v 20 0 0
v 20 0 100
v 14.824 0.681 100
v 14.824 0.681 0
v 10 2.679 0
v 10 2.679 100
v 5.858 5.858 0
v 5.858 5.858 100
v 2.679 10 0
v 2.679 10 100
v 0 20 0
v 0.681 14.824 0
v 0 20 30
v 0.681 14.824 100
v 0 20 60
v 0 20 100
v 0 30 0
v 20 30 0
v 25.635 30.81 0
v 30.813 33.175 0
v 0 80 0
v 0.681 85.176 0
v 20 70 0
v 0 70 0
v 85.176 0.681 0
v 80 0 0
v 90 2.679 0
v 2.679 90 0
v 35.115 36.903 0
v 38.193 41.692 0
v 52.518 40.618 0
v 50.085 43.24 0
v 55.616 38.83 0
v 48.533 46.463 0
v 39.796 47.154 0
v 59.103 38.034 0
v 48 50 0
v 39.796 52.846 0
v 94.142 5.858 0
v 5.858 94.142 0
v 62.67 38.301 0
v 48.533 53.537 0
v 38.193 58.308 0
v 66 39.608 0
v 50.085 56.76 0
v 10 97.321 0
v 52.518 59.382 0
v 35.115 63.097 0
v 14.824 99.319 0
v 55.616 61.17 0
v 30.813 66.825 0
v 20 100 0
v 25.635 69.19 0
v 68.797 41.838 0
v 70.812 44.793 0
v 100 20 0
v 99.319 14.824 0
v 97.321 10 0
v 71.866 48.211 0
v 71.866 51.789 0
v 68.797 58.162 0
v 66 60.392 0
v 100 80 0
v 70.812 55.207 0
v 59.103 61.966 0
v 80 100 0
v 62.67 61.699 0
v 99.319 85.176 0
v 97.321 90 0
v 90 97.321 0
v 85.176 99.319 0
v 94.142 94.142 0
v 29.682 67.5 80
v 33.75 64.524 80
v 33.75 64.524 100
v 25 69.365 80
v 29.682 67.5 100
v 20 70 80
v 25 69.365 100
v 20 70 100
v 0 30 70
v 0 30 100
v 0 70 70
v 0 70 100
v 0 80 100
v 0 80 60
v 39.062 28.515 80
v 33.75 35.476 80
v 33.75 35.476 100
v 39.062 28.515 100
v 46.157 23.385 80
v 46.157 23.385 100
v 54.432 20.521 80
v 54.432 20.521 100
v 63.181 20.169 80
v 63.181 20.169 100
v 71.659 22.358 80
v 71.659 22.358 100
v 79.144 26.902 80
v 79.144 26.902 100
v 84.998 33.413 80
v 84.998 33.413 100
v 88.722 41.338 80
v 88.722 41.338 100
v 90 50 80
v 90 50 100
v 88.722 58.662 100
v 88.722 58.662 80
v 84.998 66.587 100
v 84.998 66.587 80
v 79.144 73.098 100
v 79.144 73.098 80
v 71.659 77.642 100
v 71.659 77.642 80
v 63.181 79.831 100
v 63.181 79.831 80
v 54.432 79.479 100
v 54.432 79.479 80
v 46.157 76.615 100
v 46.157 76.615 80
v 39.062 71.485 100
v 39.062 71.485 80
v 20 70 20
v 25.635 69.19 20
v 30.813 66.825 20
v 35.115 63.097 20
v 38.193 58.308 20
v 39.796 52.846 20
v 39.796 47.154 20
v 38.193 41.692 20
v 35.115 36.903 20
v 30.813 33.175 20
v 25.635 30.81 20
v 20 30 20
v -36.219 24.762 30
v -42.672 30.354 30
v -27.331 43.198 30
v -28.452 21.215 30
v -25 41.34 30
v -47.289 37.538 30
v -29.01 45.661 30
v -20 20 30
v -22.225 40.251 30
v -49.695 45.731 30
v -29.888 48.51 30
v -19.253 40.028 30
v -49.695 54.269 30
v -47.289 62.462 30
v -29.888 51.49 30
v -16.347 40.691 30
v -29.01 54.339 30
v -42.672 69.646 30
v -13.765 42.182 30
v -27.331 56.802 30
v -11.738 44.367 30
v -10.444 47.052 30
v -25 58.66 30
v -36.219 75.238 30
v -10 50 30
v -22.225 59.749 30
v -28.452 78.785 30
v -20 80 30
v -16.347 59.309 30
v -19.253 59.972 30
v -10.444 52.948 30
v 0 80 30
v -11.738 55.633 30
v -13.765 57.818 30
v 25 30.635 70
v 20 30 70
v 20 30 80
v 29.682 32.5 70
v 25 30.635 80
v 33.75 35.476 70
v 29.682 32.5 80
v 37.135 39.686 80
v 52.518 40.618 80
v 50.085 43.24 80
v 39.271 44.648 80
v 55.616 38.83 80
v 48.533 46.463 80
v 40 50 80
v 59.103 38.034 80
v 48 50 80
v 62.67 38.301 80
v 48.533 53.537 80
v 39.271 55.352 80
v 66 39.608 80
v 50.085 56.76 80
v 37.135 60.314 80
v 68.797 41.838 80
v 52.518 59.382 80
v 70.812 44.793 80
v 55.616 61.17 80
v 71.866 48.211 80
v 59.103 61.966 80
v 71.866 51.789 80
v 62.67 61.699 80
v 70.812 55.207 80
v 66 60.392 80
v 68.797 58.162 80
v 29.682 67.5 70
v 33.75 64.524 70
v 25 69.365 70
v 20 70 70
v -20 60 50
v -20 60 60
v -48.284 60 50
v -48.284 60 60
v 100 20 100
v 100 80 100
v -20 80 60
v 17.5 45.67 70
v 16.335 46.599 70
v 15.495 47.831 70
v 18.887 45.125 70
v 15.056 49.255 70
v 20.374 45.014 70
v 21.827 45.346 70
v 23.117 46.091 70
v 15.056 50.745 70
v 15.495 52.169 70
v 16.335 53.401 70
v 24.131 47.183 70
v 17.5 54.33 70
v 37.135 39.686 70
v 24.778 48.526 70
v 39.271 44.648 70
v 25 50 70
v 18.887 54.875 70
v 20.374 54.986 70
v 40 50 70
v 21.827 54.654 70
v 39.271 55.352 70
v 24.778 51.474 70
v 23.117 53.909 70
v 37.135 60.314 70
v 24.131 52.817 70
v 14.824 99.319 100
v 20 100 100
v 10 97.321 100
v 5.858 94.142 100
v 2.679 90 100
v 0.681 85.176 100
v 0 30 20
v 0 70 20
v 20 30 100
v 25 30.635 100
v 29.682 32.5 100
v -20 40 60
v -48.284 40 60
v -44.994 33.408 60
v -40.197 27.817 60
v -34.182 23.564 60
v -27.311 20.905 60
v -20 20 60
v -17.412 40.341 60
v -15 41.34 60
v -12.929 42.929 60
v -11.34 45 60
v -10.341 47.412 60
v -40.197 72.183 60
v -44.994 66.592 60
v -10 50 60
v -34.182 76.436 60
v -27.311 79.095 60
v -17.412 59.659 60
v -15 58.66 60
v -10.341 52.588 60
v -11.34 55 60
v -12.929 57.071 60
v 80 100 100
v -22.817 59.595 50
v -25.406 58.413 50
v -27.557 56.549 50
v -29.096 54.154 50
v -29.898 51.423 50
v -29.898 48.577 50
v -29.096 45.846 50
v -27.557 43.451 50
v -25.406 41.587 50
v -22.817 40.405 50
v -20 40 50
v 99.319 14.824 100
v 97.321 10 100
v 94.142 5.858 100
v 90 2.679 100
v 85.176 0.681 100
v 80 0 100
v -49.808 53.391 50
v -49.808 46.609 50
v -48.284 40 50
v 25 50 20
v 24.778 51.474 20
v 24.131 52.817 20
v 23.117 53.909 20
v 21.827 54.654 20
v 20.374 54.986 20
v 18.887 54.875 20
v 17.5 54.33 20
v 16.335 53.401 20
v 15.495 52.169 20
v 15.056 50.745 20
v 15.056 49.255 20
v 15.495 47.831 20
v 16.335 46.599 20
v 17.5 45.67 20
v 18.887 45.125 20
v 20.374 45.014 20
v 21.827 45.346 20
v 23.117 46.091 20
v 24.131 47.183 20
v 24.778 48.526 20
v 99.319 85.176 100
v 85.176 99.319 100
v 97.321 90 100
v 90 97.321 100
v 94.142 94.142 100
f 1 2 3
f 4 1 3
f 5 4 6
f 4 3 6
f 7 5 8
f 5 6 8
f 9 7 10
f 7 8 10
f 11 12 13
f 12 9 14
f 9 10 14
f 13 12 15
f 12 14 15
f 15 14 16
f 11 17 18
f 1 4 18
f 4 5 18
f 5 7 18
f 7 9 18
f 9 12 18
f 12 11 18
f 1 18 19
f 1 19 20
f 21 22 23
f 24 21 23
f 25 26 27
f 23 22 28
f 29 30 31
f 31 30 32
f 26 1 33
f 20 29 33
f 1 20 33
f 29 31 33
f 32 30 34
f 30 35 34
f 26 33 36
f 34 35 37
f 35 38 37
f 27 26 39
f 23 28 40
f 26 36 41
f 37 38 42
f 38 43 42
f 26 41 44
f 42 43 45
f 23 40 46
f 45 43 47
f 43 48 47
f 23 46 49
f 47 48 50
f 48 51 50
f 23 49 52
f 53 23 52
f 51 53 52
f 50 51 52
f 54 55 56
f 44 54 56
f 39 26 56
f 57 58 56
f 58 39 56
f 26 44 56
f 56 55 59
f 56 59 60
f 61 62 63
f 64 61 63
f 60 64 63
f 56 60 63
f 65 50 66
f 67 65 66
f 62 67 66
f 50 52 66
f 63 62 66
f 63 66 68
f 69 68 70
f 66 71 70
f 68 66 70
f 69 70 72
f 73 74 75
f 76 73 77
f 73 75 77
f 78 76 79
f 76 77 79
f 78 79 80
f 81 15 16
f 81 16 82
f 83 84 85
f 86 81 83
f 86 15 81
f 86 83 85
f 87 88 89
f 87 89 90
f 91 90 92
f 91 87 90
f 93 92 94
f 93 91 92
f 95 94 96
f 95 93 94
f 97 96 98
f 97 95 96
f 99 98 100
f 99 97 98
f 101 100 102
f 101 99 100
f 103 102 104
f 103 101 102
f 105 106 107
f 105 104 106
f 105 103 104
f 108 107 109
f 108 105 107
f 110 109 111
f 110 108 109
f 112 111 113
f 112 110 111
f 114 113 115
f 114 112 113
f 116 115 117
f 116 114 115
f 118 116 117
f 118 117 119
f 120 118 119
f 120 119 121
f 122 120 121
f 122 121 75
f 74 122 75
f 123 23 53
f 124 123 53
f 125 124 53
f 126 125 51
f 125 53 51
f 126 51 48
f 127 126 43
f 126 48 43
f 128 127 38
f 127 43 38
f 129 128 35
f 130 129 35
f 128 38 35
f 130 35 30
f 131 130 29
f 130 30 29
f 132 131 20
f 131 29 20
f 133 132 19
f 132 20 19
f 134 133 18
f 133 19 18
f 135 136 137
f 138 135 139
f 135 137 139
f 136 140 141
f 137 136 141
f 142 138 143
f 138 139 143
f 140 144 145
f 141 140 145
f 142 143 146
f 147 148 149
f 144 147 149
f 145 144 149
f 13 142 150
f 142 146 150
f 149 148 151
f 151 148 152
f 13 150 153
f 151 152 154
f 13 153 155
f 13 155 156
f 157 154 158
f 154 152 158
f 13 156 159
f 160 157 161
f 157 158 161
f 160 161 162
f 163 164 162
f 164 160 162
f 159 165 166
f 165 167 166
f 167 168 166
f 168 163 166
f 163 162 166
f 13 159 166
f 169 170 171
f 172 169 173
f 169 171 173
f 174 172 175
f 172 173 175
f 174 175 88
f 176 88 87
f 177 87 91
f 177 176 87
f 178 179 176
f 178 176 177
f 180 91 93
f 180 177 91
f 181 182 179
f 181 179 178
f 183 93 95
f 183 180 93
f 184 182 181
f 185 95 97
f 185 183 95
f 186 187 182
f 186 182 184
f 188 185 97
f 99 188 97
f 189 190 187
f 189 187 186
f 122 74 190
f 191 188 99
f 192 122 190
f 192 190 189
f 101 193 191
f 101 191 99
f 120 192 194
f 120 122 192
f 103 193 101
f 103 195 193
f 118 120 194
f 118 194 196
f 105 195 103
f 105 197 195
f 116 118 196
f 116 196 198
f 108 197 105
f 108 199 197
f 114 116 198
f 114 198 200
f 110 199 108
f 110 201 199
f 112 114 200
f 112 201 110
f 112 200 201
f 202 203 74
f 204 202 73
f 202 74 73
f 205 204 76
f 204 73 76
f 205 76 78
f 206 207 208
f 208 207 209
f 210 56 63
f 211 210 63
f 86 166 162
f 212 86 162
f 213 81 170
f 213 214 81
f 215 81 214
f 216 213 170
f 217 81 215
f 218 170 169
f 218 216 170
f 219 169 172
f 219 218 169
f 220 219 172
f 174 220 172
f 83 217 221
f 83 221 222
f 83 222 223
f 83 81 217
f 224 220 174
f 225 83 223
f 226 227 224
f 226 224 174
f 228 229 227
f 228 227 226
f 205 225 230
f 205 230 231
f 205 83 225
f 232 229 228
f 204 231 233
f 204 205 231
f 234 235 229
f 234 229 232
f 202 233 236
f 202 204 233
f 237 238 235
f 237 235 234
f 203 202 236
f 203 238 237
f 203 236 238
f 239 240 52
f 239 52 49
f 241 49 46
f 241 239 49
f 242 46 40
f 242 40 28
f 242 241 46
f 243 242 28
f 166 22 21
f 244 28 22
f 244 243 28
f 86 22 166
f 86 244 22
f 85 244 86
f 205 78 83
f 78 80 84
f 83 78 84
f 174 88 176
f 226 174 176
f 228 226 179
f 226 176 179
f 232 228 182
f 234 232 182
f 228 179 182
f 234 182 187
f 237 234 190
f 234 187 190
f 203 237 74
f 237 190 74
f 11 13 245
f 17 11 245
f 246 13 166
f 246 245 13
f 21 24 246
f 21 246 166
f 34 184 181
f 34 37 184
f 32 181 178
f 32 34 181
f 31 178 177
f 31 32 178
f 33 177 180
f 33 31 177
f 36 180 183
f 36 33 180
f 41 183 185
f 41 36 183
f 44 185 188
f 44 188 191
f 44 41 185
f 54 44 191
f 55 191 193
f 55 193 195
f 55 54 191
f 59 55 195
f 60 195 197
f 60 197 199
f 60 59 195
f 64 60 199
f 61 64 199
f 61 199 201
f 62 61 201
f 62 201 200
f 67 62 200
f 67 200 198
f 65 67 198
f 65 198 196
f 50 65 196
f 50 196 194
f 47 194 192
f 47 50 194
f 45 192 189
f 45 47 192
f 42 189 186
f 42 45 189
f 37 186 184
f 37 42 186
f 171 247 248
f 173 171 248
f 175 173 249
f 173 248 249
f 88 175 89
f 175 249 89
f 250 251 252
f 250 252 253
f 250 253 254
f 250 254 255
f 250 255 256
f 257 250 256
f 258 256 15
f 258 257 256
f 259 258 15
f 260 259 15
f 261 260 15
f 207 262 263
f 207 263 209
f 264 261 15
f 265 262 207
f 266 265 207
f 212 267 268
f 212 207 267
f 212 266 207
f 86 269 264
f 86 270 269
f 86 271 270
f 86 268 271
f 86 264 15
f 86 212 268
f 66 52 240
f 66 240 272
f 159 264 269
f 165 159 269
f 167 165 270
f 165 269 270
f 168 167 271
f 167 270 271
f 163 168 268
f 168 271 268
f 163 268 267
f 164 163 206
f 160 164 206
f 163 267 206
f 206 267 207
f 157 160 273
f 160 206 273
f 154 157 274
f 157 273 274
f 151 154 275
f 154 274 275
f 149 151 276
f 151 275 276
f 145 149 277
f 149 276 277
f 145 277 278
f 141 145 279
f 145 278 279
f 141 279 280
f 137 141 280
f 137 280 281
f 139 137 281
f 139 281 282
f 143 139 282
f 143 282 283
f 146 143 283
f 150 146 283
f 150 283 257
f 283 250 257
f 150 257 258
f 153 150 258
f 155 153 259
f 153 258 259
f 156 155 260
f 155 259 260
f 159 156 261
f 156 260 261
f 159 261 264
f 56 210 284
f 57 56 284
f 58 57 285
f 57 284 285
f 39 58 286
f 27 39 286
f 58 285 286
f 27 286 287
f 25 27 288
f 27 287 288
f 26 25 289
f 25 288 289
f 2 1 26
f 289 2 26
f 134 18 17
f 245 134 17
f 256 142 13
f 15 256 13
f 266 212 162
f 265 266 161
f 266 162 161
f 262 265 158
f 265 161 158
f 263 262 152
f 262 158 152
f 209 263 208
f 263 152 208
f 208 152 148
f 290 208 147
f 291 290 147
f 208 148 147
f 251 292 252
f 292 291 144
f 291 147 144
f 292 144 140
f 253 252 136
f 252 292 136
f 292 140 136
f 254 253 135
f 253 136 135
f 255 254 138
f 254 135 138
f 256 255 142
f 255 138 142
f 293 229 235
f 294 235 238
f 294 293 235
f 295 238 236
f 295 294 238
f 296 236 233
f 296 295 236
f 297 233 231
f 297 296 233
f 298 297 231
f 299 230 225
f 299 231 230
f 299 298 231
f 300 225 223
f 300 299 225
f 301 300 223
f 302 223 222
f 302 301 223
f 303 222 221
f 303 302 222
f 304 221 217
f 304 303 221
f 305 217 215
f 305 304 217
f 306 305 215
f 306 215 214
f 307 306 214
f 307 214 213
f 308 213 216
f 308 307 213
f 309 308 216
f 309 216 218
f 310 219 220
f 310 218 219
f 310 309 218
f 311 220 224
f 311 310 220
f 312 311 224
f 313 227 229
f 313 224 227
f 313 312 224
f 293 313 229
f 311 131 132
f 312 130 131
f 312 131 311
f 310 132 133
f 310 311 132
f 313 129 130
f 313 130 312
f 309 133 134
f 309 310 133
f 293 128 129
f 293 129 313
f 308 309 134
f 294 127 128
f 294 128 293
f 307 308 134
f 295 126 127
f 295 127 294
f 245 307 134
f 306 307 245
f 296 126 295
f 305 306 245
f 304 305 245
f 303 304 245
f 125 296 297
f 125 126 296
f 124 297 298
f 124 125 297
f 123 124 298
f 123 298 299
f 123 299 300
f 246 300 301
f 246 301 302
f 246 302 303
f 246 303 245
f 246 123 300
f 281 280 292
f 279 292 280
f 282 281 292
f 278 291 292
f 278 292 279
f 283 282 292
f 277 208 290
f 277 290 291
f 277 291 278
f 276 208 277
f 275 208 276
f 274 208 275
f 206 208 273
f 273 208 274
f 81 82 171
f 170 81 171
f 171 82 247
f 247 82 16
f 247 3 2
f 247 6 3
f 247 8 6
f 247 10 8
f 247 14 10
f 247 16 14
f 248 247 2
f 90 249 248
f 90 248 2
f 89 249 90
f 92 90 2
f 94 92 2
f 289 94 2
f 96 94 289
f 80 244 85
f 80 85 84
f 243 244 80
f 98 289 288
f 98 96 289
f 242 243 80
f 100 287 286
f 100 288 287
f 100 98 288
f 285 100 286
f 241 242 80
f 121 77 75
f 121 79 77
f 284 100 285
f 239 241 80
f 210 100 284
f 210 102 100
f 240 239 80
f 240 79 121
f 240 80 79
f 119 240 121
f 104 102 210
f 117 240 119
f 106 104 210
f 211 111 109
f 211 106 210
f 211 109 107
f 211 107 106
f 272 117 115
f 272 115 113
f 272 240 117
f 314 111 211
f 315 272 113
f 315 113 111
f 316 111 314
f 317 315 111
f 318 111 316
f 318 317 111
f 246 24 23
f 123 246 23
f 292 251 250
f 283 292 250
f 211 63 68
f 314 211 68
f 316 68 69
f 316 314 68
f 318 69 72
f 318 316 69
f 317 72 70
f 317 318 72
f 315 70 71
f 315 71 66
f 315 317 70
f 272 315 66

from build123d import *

# Parameters (mm, degrees)
SKETCH1_W           = 100
SKETCH1_H           = 100
BOSS_EXTRUDE1_DEPTH = 100
CUT_EXTRUDE1_DEPTH  = 100
SKETCH3_R           = 12
CUT_EXTRUDE2_DEPTH  = 80
SKETCH5_R           = 5
CUT_EXTRUDE3_DEPTH  = 50
BOSS_EXTRUDE2_DEPTH = 30
SKETCH8_R           = 10
CUT_EXTRUDE4_DEPTH  = 30
CUT_EXTRUDE5_DEPTH  = 10
SKETCH10_R          = 30
CUT_EXTRUDE6_DEPTH  = 96
CUT_EXTRUDE7_DEPTH  = 30
BOSS_EXTRUDE5_DEPTH = 10
SKETCH15_R          = 30
SKETCH15_R_2        = 12
BOSS_EXTRUDE6_DEPTH = 40
SKETCH16_R          = 12
BOSS_EXTRUDE7_DEPTH = 10
CUT_EXTRUDE8_DEPTH  = 10
CUT_EXTRUDE9_DEPTH  = 20


with BuildPart() as part:
    # Sketch1 → Boss-Extrude1 (new body)
    with BuildSketch(Plane.XY):
        with Locations((50, 50)):
            Rectangle(SKETCH1_W, SKETCH1_H)
    extrude(amount=BOSS_EXTRUDE1_DEPTH)

    # Sketch2 → Cut-Extrude1 (cut)
    with BuildSketch(Plane.XY.offset(100)):
        with BuildLine():
            Line((0, 80), (0, 100))
            Line((0, 100), (20, 100))
            ThreePointArc((20, 100), (5.857864376, 94.142135624), (0, 80))
        make_face()
        with BuildLine():
            Line((80, 100), (100, 100))
            Line((100, 100), (100, 80))
            ThreePointArc((100, 80), (94.142135624, 94.142135624), (80, 100))
        make_face()
        with BuildLine():
            Line((80, 0), (100, 0))
            Line((100, 0), (100, 20))
            ThreePointArc((100, 20), (94.142135624, 5.857864376), (80, 0))
        make_face()
        with BuildLine():
            Line((0, 20), (0, 0))
            Line((0, 0), (20, 0))
            ThreePointArc((20, 0), (5.857864376, 5.857864376), (0, 20))
        make_face()
    extrude(amount=-CUT_EXTRUDE1_DEPTH, mode=Mode.SUBTRACT)

    # Sketch3 → Cut-Extrude2 (cut)
    with BuildSketch(Plane(origin=(0, 0, 0), x_dir=(-1, 0, 0), z_dir=(0, 0, -1))):
        with Locations((-60, 50)):
            Circle(SKETCH3_R)
    extrude(amount=-CUT_EXTRUDE2_DEPTH, mode=Mode.SUBTRACT)

    # Sketch5 → Cut-Extrude3 (cut)
    with BuildSketch(Plane.XY.offset(20)):
        with Locations((20, 50)):
            Circle(SKETCH5_R)
    extrude(amount=CUT_EXTRUDE3_DEPTH, mode=Mode.SUBTRACT)

    # Sketch7 → Boss-Extrude2 (add)
    with BuildSketch(Plane.XY.offset(30)):
        with BuildLine():
            Line((0, 80), (-20, 80))
            ThreePointArc((-20, 80), (-50, 50), (-20, 20))
            Line((-20, 20), (0, 20))
            Line((0, 20), (0, 80))
        make_face()
    extrude(amount=BOSS_EXTRUDE2_DEPTH)

    # Sketch8 → Cut-Extrude4 (cut)
    with BuildSketch(Plane.XY.offset(60)):
        with Locations((-20, 50)):
            Circle(SKETCH8_R)
    extrude(amount=-CUT_EXTRUDE4_DEPTH, mode=Mode.SUBTRACT)

    # Sketch9 → Cut-Extrude5 (cut)
    with BuildSketch(Plane.XY.offset(60)):
        with BuildLine():
            Line((-20, 60), (-48.284271247, 60))
            ThreePointArc((-48.284271247, 60), (-50, 50), (-48.284271247, 40))
            Line((-48.284271247, 40), (-20, 40))
            ThreePointArc((-20, 40), (-30, 50), (-20, 60))
        make_face()
    extrude(amount=-CUT_EXTRUDE5_DEPTH, mode=Mode.SUBTRACT)

    # Sketch10 → Cut-Extrude6 (cut)
    with BuildSketch(Plane.XY.offset(30)):
        with Locations(Location((60, 50, 0), (0, 0, 180))):
            Circle(SKETCH10_R)
    extrude(amount=CUT_EXTRUDE6_DEPTH, mode=Mode.SUBTRACT)

    # Sketch11 → Cut-Extrude7 (cut)
    with BuildSketch(Plane.XY.offset(100)):
        with BuildLine():
            Line((20, 70), (0, 70))
            Line((0, 70), (0, 30))
            Line((0, 30), (20, 30))
            ThreePointArc((20, 30), (40, 50), (20, 70))
        make_face()
    extrude(amount=-CUT_EXTRUDE7_DEPTH, mode=Mode.SUBTRACT)

    # Sketch14 → Boss-Extrude5 (add)
    with BuildSketch(Plane.XY.offset(70)):
        with BuildLine():
            Line((20, 55), (20, 70))
            ThreePointArc((20, 70), (40, 50), (20, 30))
            Line((20, 30), (20, 45))
            ThreePointArc((20, 45), (25, 50), (20, 55))
        make_face()
    extrude(amount=BOSS_EXTRUDE5_DEPTH)

    # Sketch15 → Boss-Extrude6 (add)
    with BuildSketch(Plane.XY.offset(30)):
        with Locations((60, 50)):
            Circle(SKETCH15_R)
        with Locations(Location((60, 50, 0), (0, 0, 180))):
            Circle(SKETCH15_R_2, mode=Mode.SUBTRACT)
    extrude(amount=BOSS_EXTRUDE6_DEPTH)

    # Sketch16 → Boss-Extrude7 (add)
    with BuildSketch(Plane.XY.offset(70)):
        with BuildLine():
            ThreePointArc((33.75, 35.476312452), (90, 50), (33.75, 64.523687548))
            ThreePointArc((33.75, 64.523687548), (40, 50), (33.75, 35.476312452))
        make_face()
        with Locations(Location((60, 50, 0), (0, 0, 180))):
            Circle(SKETCH16_R, mode=Mode.SUBTRACT)
    extrude(amount=BOSS_EXTRUDE7_DEPTH)

    # Sketch17 → Cut-Extrude8 (cut)
    with BuildSketch(Plane.XY.offset(80)):
        with BuildLine():
            Line((20, 70), (20, 55))
            ThreePointArc((20, 55), (25, 50), (20, 45))
            Line((20, 45), (20, 30))
            ThreePointArc((20, 30), (27.400211113, 31.419448999), (33.75, 35.476312452))
            ThreePointArc((33.75, 35.476312452), (40, 50), (33.75, 64.523687548))
            ThreePointArc((33.75, 64.523687548), (27.400211113, 68.580551001), (20, 70))
        make_face()
    extrude(amount=-CUT_EXTRUDE8_DEPTH, mode=Mode.SUBTRACT)

    # Sketch18 → Cut-Extrude9 (cut)
    with BuildSketch(Plane(origin=(0, 0, 0), x_dir=(-1, 0, 0), z_dir=(0, 0, -1))):
        with BuildLine():
            Line((0, 70), (-20, 70))
            ThreePointArc((-20, 70), (-40, 50), (-20, 30))
            Line((-20, 30), (0, 30))
            Line((0, 30), (0, 70))
        make_face()
    extrude(amount=-CUT_EXTRUDE9_DEPTH, mode=Mode.SUBTRACT)


solid = part.part
